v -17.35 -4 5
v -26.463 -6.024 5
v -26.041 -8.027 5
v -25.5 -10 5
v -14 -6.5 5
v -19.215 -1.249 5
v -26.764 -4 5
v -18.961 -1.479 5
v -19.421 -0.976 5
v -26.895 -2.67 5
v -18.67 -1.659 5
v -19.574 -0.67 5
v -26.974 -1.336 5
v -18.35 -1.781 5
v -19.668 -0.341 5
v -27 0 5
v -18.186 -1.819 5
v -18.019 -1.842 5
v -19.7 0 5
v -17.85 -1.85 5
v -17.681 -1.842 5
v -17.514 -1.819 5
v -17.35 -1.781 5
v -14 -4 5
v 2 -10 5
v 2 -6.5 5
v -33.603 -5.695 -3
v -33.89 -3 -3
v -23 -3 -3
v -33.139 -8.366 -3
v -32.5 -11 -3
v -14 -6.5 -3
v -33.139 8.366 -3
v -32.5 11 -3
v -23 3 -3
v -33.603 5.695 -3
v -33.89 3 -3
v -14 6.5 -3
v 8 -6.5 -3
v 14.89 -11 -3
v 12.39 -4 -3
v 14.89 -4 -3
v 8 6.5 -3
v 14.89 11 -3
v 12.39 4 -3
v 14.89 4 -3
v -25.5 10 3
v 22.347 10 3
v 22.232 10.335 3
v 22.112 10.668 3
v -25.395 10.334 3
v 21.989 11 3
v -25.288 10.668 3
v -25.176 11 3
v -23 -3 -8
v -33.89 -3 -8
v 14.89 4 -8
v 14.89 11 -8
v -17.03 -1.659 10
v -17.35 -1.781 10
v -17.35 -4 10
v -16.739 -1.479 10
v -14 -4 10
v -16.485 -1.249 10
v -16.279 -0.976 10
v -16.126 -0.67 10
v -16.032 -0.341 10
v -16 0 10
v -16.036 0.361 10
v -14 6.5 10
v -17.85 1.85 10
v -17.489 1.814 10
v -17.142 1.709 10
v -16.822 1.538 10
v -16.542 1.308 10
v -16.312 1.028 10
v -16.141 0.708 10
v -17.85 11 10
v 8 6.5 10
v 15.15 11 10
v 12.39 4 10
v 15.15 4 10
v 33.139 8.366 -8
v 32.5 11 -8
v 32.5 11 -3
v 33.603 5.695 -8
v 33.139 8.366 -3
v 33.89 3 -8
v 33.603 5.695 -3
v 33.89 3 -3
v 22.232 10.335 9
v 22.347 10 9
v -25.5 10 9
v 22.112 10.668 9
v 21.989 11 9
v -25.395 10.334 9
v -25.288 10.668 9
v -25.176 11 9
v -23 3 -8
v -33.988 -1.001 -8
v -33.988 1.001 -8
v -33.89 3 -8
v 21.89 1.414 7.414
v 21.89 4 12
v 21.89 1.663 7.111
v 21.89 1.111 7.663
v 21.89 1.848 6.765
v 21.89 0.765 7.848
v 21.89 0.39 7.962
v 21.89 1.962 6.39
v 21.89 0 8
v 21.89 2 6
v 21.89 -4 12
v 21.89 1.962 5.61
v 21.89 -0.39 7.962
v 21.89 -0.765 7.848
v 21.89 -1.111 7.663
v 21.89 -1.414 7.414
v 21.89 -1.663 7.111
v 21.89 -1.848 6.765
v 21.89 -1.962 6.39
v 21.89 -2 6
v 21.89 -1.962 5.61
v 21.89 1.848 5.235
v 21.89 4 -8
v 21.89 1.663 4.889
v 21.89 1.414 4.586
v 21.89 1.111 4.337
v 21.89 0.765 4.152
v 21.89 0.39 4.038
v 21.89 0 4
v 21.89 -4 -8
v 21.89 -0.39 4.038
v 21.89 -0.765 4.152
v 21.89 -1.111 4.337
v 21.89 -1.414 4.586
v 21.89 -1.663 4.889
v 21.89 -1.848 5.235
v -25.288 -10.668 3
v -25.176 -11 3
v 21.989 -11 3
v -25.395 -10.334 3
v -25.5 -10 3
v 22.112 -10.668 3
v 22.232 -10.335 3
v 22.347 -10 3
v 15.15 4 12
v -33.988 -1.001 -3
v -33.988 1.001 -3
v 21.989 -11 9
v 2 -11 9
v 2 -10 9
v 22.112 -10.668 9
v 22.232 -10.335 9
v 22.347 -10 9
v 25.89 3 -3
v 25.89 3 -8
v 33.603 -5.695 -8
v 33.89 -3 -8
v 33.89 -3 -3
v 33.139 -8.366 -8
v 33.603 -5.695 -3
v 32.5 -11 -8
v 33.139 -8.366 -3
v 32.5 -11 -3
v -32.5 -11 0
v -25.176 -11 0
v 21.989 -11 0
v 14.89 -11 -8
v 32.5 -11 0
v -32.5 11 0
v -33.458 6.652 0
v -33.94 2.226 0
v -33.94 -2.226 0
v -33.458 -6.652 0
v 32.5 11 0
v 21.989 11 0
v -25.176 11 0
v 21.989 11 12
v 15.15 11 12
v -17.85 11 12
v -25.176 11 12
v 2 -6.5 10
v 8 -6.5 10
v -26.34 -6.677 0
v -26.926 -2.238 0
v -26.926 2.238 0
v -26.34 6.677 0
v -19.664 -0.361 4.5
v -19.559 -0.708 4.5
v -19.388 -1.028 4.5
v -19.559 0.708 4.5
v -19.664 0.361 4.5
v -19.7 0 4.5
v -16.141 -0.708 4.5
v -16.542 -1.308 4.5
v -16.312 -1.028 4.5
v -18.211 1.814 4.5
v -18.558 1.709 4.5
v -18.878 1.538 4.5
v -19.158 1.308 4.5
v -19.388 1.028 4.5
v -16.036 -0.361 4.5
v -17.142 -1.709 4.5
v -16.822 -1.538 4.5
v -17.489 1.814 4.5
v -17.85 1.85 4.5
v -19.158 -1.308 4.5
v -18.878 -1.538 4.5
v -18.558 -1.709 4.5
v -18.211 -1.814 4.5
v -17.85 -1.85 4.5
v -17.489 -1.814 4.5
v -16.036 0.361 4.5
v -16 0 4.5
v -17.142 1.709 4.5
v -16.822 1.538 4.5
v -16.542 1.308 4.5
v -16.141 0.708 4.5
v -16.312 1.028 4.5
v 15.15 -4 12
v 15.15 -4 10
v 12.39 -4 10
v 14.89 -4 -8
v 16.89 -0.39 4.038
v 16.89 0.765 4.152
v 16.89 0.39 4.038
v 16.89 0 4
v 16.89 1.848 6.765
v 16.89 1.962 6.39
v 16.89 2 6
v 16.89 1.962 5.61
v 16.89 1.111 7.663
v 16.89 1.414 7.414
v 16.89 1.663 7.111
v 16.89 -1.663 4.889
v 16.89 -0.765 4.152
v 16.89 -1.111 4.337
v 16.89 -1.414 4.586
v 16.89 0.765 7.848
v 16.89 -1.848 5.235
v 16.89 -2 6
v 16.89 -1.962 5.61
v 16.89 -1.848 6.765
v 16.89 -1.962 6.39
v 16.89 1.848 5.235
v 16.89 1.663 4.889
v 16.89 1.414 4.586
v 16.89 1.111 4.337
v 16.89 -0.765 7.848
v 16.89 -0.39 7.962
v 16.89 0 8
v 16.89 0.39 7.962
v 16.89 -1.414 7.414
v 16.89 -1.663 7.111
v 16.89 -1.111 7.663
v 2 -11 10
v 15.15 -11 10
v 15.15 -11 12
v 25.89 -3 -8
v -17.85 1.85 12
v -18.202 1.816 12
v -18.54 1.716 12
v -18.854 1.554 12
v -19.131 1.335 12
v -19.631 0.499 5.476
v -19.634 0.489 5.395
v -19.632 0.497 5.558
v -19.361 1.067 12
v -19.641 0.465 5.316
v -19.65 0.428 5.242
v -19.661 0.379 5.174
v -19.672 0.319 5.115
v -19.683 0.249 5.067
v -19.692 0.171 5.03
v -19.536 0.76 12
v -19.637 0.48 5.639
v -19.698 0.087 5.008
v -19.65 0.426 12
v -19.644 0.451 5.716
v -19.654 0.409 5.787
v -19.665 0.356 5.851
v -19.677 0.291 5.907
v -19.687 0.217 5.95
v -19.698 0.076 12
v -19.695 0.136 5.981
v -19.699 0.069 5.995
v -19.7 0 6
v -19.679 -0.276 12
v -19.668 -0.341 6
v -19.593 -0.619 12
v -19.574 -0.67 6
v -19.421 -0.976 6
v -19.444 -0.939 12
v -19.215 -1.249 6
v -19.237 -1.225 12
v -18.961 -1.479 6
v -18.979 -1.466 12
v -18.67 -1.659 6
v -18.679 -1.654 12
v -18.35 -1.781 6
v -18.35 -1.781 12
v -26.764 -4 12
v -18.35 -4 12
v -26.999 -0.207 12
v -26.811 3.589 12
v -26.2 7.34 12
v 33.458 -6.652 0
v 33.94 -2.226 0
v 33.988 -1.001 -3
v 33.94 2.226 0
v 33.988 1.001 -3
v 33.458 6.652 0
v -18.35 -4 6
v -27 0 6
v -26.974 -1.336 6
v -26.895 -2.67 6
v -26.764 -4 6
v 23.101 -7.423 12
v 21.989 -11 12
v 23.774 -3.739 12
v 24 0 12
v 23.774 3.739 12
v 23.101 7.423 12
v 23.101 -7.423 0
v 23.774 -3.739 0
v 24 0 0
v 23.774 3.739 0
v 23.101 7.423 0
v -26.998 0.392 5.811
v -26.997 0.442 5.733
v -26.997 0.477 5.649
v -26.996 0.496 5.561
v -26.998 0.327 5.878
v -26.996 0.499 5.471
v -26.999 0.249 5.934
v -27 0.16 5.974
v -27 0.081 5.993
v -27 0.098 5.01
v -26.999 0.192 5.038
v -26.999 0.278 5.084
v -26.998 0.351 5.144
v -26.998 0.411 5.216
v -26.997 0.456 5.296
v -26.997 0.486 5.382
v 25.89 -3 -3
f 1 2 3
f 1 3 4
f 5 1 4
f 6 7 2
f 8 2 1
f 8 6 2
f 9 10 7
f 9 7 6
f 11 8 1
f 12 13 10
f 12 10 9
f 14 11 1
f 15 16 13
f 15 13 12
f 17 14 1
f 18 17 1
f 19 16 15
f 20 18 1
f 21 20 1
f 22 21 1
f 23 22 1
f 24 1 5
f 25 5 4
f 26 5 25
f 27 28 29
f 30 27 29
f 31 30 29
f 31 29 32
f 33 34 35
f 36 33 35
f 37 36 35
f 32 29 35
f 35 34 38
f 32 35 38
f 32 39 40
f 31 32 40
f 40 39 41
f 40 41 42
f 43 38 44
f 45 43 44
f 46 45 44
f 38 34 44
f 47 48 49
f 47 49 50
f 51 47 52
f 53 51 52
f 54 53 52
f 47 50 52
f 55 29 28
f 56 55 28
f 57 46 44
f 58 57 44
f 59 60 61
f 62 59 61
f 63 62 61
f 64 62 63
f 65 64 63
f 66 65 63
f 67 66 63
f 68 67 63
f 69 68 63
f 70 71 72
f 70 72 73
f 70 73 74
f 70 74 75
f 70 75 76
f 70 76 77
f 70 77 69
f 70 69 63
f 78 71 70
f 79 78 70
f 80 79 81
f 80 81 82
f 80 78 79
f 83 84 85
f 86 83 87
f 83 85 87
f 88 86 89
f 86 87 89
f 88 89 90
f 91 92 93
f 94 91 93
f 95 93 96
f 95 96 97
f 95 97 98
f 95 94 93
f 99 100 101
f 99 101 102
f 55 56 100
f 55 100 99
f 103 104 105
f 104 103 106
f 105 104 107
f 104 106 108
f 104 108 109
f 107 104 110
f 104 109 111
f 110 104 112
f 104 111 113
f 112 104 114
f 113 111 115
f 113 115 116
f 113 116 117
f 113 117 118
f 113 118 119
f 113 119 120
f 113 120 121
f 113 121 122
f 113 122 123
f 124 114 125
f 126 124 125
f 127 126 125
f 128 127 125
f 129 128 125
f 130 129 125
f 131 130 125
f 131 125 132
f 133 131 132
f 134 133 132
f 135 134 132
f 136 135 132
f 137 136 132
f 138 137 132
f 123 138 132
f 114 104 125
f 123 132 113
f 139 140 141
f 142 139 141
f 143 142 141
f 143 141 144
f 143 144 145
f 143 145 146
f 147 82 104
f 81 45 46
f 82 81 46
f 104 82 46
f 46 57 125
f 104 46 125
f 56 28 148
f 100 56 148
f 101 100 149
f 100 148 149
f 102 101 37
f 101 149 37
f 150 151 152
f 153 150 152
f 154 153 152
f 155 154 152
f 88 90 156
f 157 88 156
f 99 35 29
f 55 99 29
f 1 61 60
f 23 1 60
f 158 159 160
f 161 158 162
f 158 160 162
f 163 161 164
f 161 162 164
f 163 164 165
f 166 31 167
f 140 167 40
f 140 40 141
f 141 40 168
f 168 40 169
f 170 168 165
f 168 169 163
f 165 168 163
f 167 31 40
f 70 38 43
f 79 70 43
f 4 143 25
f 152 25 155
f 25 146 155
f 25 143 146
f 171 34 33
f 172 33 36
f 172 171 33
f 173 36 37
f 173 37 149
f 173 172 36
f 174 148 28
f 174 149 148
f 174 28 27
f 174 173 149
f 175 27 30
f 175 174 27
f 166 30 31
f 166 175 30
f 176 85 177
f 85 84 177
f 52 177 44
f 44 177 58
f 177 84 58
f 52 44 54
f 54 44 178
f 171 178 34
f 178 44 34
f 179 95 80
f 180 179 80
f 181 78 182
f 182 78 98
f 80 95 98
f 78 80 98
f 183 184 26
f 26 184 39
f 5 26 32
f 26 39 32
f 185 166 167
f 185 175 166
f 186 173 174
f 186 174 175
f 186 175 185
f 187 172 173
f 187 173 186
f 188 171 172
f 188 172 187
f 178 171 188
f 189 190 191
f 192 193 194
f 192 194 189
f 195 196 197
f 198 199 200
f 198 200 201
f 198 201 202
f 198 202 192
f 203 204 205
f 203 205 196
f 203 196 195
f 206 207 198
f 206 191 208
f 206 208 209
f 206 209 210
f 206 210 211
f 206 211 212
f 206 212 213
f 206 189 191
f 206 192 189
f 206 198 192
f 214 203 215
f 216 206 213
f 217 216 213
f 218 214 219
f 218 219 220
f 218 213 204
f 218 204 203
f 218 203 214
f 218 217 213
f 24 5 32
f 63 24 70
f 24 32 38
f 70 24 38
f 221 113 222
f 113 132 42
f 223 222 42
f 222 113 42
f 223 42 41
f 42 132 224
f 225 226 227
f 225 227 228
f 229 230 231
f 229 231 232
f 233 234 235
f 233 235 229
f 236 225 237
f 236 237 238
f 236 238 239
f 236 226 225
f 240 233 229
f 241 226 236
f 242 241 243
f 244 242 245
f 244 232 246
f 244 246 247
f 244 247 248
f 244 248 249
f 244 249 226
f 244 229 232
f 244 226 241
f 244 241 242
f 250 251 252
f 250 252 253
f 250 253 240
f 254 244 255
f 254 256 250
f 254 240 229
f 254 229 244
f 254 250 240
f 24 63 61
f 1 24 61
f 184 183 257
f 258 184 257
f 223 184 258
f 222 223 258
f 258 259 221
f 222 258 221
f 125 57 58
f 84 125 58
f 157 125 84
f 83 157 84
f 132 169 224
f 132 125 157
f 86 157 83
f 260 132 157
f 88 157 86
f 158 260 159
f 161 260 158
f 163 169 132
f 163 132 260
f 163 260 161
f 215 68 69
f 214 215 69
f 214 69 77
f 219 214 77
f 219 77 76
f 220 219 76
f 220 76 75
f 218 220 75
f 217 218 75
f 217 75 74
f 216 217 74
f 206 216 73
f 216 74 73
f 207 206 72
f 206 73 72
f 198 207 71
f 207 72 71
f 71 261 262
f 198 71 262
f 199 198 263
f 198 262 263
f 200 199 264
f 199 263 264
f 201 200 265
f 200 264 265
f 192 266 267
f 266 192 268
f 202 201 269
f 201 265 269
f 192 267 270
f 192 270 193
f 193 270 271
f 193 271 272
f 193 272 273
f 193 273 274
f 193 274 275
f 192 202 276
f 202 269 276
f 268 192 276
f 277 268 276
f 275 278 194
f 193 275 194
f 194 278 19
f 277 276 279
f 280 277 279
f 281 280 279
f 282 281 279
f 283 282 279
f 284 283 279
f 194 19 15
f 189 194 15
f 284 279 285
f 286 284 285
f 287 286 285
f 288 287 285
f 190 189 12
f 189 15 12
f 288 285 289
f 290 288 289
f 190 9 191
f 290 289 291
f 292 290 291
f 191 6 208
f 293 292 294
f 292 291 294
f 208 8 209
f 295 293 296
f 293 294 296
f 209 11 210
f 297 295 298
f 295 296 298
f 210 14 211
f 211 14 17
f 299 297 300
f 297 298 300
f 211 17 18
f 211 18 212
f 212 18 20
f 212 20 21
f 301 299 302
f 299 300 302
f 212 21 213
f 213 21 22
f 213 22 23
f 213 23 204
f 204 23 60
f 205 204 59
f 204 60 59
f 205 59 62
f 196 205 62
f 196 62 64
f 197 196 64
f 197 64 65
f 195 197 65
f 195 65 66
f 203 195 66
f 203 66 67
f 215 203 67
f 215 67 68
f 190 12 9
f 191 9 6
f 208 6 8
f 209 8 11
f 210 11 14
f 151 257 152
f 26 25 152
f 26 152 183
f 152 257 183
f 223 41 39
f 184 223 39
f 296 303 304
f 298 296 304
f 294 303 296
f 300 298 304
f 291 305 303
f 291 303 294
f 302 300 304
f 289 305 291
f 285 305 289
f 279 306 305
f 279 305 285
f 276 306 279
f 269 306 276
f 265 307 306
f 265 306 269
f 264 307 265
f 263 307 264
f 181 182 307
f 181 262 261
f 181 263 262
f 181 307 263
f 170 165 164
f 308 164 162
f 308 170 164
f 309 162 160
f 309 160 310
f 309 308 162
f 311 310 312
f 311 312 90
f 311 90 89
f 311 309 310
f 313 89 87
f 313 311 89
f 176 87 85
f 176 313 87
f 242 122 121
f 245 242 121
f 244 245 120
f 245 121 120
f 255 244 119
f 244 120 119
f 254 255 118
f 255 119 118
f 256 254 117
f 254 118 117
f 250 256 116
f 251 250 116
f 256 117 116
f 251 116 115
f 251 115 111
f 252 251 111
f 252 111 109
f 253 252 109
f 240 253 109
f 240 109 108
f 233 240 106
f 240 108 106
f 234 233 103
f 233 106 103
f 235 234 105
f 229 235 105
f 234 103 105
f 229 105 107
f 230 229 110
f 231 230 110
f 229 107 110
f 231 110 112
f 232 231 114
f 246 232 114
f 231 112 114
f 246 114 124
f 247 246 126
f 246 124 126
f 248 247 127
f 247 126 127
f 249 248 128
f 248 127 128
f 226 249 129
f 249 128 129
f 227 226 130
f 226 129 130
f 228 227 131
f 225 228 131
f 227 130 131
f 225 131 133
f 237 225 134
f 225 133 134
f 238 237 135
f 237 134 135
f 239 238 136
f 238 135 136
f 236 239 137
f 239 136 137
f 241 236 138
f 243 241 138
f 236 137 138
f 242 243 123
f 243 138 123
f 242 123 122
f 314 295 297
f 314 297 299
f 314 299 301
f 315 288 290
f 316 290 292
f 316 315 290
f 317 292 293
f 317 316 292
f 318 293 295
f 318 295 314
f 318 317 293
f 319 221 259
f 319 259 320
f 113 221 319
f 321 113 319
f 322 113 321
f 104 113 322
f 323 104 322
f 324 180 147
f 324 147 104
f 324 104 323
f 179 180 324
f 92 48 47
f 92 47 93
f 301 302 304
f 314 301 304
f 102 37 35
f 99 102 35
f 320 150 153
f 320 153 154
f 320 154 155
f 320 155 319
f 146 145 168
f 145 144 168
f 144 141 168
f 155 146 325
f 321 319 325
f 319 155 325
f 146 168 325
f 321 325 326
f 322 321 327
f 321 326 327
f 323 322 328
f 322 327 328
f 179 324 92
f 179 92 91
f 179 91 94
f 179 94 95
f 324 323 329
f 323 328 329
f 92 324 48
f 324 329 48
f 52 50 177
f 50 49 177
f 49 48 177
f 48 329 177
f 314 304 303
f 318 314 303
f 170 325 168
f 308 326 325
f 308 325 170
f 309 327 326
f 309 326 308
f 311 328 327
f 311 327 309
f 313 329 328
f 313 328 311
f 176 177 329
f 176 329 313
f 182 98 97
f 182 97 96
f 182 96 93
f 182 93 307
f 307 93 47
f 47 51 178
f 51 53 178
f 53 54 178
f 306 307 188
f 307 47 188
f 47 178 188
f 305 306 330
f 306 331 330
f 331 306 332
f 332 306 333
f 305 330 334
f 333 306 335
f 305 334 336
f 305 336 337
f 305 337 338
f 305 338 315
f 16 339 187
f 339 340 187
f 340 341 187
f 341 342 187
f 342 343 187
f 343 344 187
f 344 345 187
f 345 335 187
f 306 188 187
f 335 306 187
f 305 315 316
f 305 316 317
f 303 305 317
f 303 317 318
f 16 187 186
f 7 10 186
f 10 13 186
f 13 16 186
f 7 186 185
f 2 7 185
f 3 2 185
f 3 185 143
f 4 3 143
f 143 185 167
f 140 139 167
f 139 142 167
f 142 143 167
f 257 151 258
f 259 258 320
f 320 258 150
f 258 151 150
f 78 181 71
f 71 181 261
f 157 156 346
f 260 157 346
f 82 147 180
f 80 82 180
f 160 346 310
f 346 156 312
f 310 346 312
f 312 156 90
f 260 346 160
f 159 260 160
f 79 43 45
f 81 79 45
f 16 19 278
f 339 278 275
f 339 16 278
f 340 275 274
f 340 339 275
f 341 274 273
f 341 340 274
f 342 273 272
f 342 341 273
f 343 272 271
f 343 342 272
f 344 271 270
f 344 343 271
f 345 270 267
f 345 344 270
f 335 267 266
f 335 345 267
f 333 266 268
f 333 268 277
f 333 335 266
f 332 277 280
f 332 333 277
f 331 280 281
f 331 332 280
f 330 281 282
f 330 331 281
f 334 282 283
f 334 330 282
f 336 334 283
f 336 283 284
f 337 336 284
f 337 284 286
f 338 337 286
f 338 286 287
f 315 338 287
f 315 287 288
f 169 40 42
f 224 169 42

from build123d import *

# Parameters (mm, degrees)
F1_DEPTH      = 3
F3_DEPTH      = 5
F5_DEPTH      = 3.001
F7_DEPTH      = 12
F8_W          = 1
F8_H          = 6
F9_DEPTH      = 34.001
F9_DEPTH_BACK = 34.001
F10_R         = 1.85
F11_DEPTH     = 7.5
F13_DEPTH     = 2
F14_DEPTH     = 7
F18_DEPTH     = 16.65
F19_R         = 2
F20_DEPTH     = 5


with BuildPart() as f1:
    # F0 (on Top) → F1 (new body)
    with BuildSketch(Plane.XY):
        with BuildLine():
            ThreePointArc((32.5, -11), (34, 0), (32.5, 11))
            Line((32.5, 11), (-32.5, 11))
            ThreePointArc((-32.5, 11), (-34, 0), (-32.5, -11))
            Line((-32.5, -11), (32.5, -11))
        make_face()
    extrude(amount=-F1_DEPTH)

    # F2 (on face) → F3 (join)
    with BuildSketch(Plane(origin=(0, 0, -3), x_dir=(1, 0, 0), z_dir=(0, 0, -1))):
        with BuildLine():
            Line((-23, 3), (-33.8903201257, 3))
            ThreePointArc((-33.8903201257, 3), (-34, 0), (-33.8903201257, -3))
            Line((-33.8903201257, -3), (-23, -3))
            Line((-23, -3), (-23, 0))
            Line((-23, 0), (-23, 3))
        make_face()
        with BuildLine():
            Line((25.8903201257, 3), (33.8903201257, 3))
            ThreePointArc((33.8903201257, 3), (33.3932899234, 7.0344329916), (32.5, 11))
            Line((32.5, 11), (14.8903201257, 11))
            Line((14.8903201257, 11), (14.8903201257, 4))
            Line((14.8903201257, 4), (21.8903201257, 4))
            Line((21.8903201257, 4), (21.8903201257, 0))
            Line((21.8903201257, 0), (21.8903201257, -4))
            Line((21.8903201257, -4), (14.8903201257, -4))
            Line((14.8903201257, -4), (14.8903201257, -11))
            Line((14.8903201257, -11), (32.5, -11))
            ThreePointArc((32.5, -11), (33.3932899234, -7.0344329916), (33.8903201257, -3))
            Line((33.8903201257, -3), (25.8903201257, -3))
            Line((25.8903201257, -3), (25.8903201257, 0))
            Line((25.8903201257, 0), (25.8903201257, 3))
        make_face()
    extrude(amount=F3_DEPTH)

    # F4 (on face) → F5 (cut, through all)
    with BuildSketch(Plane(origin=(0, 0, -3), x_dir=(1, 0, 0), z_dir=(0, 0, -1))):
        Polygon((21.8903201257, -4), (21.8903201257, 4), (14.8903201257, 4), (12.3903201257, 4), (8, 6.5), (-14, 6.5), (-14, 0), (-14, -6.5), (8, -6.5), (12.3903201257, -4), (14.8903201257, -4), align=None)
    extrude(amount=-F5_DEPTH, mode=Mode.SUBTRACT)

    # F6 (on face) → F7 (join)
    with BuildSketch(Plane.XY):
        with BuildLine():
            Line((21.9885364227, 11), (-25.1761398662, 11))
            ThreePointArc((-25.1761398662, 11), (-27, 0), (-25.1761398662, -11))
            Line((-25.1761398662, -11), (21.9885364227, -11))
            ThreePointArc((21.9885364227, -11), (24, 0), (21.9885364227, 11))
        make_face()
        Polygon((12.3903201257, 4), (21.8903201257, 4), (21.8903201257, -4), (12.3903201257, -4), (8, -6.5), (-14, -6.5), (-14, 6.5), (8, 6.5), align=None, mode=Mode.SUBTRACT)
    extrude(amount=F7_DEPTH)

    # F8 (on Right) → F9 (cut, two sides)
    with BuildSketch(Plane.YZ) as f9_sk:
        with Locations((-10.5, 6)):
            Rectangle(F8_W, F8_H)
        with Locations((10.5, 6)):
            Rectangle(F8_W, F8_H)
    extrude(amount=-F9_DEPTH, mode=Mode.SUBTRACT)
    extrude(f9_sk.sketch, amount=F9_DEPTH_BACK, mode=Mode.SUBTRACT)

    # F10 (on face) → F11 (cut)
    with BuildSketch(Plane.XY.offset(12)):
        with Locations((-17.85, 0)):
            Circle(F10_R)
    extrude(amount=-F11_DEPTH, mode=Mode.SUBTRACT)

    # F12 (on face) → F13 (cut)
    with BuildSketch(Plane.XY.offset(12)):
        with BuildLine():
            Line((15.15, 11), (-17.85, 11))
            Line((-17.85, 11), (-17.85, 1.85))
            ThreePointArc((-17.85, 1.85), (-16.5418524548, 1.3081475452), (-16, 0))
            ThreePointArc((-16, 0), (-16.3756357302, -1.1174748319), (-17.35, -1.7811513131))
            Line((-17.35, -1.7811513131), (-17.35, -4))
            Line((-17.35, -4), (-14, -4))
            Line((-14, -4), (-14, 6.5))
            Line((-14, 6.5), (8, 6.5))
            Line((8, 6.5), (12.3903201257, 4))
            Line((12.3903201257, 4), (15.15, 4))
            Line((15.15, 4), (15.15, 11))
        make_face()
        Polygon((-17.35, -4), (-17.85, -4), (-17.85, -11), (2, -11), (2, -6.5), (-14, -6.5), (-14, -4), align=None)
        Polygon((15.15, -11), (15.15, -4), (12.3903201257, -4), (8, -6.5), (2, -6.5), (2, -11), align=None)
    extrude(amount=-F13_DEPTH, mode=Mode.SUBTRACT)

    # F12 (on face) → F14 (cut)
    with BuildSketch(Plane.XY.offset(12)):
        Polygon((-17.35, -4), (-17.85, -4), (-17.85, -11), (2, -11), (2, -6.5), (-14, -6.5), (-14, -4), align=None)
        with BuildLine():
            Line((-18.35, -4), (-26.7644673502, -4))
            ThreePointArc((-26.7644673502, -4), (-26.1550919462, -7.5419291994), (-25.1761398662, -11))
            Line((-25.1761398662, -11), (-17.85, -11))
            Line((-17.85, -11), (-17.85, -4))
            Line((-17.85, -4), (-18.35, -4))
        make_face()
        with BuildLine():
            ThreePointArc((-17.35, -1.7811513131), (-17.5976410584, -1.8327070046), (-17.85, -1.85))
            Line((-17.85, -1.85), (-17.85, -4))
            Line((-17.85, -4), (-17.35, -4))
            Line((-17.35, -4), (-17.35, -1.7811513131))
        make_face()
        with BuildLine():
            ThreePointArc((-17.85, -1.85), (-18.1023589416, -1.8327070046), (-18.35, -1.7811513131))
            Line((-18.35, -1.7811513131), (-18.35, -4))
            Line((-18.35, -4), (-17.85, -4))
            Line((-17.85, -4), (-17.85, -1.85))
        make_face()
    extrude(amount=-F14_DEPTH, mode=Mode.SUBTRACT)

    # F17 (on plane+point) → F18 (cut, through all)
    with BuildSketch(Plane.YZ.offset(-34)):
        with BuildLine():
            Line((-4, 6), (-4, 5))
            Line((-4, 5), (0, 5))
            ThreePointArc((0, 5), (0.5, 5.5), (0, 6))
            Line((0, 6), (-4, 6))
        make_face()
    extrude(amount=F18_DEPTH, mode=Mode.SUBTRACT)

    # F19 (on face) → F20 (join)
    with BuildSketch(Plane(origin=(21.8903201257, 0, 0), x_dir=(0, -1, 0), z_dir=(-1, 0, 0))):
        with Locations((0, 6)):
            Circle(F19_R)
    extrude(amount=F20_DEPTH)


solid = f1.part
